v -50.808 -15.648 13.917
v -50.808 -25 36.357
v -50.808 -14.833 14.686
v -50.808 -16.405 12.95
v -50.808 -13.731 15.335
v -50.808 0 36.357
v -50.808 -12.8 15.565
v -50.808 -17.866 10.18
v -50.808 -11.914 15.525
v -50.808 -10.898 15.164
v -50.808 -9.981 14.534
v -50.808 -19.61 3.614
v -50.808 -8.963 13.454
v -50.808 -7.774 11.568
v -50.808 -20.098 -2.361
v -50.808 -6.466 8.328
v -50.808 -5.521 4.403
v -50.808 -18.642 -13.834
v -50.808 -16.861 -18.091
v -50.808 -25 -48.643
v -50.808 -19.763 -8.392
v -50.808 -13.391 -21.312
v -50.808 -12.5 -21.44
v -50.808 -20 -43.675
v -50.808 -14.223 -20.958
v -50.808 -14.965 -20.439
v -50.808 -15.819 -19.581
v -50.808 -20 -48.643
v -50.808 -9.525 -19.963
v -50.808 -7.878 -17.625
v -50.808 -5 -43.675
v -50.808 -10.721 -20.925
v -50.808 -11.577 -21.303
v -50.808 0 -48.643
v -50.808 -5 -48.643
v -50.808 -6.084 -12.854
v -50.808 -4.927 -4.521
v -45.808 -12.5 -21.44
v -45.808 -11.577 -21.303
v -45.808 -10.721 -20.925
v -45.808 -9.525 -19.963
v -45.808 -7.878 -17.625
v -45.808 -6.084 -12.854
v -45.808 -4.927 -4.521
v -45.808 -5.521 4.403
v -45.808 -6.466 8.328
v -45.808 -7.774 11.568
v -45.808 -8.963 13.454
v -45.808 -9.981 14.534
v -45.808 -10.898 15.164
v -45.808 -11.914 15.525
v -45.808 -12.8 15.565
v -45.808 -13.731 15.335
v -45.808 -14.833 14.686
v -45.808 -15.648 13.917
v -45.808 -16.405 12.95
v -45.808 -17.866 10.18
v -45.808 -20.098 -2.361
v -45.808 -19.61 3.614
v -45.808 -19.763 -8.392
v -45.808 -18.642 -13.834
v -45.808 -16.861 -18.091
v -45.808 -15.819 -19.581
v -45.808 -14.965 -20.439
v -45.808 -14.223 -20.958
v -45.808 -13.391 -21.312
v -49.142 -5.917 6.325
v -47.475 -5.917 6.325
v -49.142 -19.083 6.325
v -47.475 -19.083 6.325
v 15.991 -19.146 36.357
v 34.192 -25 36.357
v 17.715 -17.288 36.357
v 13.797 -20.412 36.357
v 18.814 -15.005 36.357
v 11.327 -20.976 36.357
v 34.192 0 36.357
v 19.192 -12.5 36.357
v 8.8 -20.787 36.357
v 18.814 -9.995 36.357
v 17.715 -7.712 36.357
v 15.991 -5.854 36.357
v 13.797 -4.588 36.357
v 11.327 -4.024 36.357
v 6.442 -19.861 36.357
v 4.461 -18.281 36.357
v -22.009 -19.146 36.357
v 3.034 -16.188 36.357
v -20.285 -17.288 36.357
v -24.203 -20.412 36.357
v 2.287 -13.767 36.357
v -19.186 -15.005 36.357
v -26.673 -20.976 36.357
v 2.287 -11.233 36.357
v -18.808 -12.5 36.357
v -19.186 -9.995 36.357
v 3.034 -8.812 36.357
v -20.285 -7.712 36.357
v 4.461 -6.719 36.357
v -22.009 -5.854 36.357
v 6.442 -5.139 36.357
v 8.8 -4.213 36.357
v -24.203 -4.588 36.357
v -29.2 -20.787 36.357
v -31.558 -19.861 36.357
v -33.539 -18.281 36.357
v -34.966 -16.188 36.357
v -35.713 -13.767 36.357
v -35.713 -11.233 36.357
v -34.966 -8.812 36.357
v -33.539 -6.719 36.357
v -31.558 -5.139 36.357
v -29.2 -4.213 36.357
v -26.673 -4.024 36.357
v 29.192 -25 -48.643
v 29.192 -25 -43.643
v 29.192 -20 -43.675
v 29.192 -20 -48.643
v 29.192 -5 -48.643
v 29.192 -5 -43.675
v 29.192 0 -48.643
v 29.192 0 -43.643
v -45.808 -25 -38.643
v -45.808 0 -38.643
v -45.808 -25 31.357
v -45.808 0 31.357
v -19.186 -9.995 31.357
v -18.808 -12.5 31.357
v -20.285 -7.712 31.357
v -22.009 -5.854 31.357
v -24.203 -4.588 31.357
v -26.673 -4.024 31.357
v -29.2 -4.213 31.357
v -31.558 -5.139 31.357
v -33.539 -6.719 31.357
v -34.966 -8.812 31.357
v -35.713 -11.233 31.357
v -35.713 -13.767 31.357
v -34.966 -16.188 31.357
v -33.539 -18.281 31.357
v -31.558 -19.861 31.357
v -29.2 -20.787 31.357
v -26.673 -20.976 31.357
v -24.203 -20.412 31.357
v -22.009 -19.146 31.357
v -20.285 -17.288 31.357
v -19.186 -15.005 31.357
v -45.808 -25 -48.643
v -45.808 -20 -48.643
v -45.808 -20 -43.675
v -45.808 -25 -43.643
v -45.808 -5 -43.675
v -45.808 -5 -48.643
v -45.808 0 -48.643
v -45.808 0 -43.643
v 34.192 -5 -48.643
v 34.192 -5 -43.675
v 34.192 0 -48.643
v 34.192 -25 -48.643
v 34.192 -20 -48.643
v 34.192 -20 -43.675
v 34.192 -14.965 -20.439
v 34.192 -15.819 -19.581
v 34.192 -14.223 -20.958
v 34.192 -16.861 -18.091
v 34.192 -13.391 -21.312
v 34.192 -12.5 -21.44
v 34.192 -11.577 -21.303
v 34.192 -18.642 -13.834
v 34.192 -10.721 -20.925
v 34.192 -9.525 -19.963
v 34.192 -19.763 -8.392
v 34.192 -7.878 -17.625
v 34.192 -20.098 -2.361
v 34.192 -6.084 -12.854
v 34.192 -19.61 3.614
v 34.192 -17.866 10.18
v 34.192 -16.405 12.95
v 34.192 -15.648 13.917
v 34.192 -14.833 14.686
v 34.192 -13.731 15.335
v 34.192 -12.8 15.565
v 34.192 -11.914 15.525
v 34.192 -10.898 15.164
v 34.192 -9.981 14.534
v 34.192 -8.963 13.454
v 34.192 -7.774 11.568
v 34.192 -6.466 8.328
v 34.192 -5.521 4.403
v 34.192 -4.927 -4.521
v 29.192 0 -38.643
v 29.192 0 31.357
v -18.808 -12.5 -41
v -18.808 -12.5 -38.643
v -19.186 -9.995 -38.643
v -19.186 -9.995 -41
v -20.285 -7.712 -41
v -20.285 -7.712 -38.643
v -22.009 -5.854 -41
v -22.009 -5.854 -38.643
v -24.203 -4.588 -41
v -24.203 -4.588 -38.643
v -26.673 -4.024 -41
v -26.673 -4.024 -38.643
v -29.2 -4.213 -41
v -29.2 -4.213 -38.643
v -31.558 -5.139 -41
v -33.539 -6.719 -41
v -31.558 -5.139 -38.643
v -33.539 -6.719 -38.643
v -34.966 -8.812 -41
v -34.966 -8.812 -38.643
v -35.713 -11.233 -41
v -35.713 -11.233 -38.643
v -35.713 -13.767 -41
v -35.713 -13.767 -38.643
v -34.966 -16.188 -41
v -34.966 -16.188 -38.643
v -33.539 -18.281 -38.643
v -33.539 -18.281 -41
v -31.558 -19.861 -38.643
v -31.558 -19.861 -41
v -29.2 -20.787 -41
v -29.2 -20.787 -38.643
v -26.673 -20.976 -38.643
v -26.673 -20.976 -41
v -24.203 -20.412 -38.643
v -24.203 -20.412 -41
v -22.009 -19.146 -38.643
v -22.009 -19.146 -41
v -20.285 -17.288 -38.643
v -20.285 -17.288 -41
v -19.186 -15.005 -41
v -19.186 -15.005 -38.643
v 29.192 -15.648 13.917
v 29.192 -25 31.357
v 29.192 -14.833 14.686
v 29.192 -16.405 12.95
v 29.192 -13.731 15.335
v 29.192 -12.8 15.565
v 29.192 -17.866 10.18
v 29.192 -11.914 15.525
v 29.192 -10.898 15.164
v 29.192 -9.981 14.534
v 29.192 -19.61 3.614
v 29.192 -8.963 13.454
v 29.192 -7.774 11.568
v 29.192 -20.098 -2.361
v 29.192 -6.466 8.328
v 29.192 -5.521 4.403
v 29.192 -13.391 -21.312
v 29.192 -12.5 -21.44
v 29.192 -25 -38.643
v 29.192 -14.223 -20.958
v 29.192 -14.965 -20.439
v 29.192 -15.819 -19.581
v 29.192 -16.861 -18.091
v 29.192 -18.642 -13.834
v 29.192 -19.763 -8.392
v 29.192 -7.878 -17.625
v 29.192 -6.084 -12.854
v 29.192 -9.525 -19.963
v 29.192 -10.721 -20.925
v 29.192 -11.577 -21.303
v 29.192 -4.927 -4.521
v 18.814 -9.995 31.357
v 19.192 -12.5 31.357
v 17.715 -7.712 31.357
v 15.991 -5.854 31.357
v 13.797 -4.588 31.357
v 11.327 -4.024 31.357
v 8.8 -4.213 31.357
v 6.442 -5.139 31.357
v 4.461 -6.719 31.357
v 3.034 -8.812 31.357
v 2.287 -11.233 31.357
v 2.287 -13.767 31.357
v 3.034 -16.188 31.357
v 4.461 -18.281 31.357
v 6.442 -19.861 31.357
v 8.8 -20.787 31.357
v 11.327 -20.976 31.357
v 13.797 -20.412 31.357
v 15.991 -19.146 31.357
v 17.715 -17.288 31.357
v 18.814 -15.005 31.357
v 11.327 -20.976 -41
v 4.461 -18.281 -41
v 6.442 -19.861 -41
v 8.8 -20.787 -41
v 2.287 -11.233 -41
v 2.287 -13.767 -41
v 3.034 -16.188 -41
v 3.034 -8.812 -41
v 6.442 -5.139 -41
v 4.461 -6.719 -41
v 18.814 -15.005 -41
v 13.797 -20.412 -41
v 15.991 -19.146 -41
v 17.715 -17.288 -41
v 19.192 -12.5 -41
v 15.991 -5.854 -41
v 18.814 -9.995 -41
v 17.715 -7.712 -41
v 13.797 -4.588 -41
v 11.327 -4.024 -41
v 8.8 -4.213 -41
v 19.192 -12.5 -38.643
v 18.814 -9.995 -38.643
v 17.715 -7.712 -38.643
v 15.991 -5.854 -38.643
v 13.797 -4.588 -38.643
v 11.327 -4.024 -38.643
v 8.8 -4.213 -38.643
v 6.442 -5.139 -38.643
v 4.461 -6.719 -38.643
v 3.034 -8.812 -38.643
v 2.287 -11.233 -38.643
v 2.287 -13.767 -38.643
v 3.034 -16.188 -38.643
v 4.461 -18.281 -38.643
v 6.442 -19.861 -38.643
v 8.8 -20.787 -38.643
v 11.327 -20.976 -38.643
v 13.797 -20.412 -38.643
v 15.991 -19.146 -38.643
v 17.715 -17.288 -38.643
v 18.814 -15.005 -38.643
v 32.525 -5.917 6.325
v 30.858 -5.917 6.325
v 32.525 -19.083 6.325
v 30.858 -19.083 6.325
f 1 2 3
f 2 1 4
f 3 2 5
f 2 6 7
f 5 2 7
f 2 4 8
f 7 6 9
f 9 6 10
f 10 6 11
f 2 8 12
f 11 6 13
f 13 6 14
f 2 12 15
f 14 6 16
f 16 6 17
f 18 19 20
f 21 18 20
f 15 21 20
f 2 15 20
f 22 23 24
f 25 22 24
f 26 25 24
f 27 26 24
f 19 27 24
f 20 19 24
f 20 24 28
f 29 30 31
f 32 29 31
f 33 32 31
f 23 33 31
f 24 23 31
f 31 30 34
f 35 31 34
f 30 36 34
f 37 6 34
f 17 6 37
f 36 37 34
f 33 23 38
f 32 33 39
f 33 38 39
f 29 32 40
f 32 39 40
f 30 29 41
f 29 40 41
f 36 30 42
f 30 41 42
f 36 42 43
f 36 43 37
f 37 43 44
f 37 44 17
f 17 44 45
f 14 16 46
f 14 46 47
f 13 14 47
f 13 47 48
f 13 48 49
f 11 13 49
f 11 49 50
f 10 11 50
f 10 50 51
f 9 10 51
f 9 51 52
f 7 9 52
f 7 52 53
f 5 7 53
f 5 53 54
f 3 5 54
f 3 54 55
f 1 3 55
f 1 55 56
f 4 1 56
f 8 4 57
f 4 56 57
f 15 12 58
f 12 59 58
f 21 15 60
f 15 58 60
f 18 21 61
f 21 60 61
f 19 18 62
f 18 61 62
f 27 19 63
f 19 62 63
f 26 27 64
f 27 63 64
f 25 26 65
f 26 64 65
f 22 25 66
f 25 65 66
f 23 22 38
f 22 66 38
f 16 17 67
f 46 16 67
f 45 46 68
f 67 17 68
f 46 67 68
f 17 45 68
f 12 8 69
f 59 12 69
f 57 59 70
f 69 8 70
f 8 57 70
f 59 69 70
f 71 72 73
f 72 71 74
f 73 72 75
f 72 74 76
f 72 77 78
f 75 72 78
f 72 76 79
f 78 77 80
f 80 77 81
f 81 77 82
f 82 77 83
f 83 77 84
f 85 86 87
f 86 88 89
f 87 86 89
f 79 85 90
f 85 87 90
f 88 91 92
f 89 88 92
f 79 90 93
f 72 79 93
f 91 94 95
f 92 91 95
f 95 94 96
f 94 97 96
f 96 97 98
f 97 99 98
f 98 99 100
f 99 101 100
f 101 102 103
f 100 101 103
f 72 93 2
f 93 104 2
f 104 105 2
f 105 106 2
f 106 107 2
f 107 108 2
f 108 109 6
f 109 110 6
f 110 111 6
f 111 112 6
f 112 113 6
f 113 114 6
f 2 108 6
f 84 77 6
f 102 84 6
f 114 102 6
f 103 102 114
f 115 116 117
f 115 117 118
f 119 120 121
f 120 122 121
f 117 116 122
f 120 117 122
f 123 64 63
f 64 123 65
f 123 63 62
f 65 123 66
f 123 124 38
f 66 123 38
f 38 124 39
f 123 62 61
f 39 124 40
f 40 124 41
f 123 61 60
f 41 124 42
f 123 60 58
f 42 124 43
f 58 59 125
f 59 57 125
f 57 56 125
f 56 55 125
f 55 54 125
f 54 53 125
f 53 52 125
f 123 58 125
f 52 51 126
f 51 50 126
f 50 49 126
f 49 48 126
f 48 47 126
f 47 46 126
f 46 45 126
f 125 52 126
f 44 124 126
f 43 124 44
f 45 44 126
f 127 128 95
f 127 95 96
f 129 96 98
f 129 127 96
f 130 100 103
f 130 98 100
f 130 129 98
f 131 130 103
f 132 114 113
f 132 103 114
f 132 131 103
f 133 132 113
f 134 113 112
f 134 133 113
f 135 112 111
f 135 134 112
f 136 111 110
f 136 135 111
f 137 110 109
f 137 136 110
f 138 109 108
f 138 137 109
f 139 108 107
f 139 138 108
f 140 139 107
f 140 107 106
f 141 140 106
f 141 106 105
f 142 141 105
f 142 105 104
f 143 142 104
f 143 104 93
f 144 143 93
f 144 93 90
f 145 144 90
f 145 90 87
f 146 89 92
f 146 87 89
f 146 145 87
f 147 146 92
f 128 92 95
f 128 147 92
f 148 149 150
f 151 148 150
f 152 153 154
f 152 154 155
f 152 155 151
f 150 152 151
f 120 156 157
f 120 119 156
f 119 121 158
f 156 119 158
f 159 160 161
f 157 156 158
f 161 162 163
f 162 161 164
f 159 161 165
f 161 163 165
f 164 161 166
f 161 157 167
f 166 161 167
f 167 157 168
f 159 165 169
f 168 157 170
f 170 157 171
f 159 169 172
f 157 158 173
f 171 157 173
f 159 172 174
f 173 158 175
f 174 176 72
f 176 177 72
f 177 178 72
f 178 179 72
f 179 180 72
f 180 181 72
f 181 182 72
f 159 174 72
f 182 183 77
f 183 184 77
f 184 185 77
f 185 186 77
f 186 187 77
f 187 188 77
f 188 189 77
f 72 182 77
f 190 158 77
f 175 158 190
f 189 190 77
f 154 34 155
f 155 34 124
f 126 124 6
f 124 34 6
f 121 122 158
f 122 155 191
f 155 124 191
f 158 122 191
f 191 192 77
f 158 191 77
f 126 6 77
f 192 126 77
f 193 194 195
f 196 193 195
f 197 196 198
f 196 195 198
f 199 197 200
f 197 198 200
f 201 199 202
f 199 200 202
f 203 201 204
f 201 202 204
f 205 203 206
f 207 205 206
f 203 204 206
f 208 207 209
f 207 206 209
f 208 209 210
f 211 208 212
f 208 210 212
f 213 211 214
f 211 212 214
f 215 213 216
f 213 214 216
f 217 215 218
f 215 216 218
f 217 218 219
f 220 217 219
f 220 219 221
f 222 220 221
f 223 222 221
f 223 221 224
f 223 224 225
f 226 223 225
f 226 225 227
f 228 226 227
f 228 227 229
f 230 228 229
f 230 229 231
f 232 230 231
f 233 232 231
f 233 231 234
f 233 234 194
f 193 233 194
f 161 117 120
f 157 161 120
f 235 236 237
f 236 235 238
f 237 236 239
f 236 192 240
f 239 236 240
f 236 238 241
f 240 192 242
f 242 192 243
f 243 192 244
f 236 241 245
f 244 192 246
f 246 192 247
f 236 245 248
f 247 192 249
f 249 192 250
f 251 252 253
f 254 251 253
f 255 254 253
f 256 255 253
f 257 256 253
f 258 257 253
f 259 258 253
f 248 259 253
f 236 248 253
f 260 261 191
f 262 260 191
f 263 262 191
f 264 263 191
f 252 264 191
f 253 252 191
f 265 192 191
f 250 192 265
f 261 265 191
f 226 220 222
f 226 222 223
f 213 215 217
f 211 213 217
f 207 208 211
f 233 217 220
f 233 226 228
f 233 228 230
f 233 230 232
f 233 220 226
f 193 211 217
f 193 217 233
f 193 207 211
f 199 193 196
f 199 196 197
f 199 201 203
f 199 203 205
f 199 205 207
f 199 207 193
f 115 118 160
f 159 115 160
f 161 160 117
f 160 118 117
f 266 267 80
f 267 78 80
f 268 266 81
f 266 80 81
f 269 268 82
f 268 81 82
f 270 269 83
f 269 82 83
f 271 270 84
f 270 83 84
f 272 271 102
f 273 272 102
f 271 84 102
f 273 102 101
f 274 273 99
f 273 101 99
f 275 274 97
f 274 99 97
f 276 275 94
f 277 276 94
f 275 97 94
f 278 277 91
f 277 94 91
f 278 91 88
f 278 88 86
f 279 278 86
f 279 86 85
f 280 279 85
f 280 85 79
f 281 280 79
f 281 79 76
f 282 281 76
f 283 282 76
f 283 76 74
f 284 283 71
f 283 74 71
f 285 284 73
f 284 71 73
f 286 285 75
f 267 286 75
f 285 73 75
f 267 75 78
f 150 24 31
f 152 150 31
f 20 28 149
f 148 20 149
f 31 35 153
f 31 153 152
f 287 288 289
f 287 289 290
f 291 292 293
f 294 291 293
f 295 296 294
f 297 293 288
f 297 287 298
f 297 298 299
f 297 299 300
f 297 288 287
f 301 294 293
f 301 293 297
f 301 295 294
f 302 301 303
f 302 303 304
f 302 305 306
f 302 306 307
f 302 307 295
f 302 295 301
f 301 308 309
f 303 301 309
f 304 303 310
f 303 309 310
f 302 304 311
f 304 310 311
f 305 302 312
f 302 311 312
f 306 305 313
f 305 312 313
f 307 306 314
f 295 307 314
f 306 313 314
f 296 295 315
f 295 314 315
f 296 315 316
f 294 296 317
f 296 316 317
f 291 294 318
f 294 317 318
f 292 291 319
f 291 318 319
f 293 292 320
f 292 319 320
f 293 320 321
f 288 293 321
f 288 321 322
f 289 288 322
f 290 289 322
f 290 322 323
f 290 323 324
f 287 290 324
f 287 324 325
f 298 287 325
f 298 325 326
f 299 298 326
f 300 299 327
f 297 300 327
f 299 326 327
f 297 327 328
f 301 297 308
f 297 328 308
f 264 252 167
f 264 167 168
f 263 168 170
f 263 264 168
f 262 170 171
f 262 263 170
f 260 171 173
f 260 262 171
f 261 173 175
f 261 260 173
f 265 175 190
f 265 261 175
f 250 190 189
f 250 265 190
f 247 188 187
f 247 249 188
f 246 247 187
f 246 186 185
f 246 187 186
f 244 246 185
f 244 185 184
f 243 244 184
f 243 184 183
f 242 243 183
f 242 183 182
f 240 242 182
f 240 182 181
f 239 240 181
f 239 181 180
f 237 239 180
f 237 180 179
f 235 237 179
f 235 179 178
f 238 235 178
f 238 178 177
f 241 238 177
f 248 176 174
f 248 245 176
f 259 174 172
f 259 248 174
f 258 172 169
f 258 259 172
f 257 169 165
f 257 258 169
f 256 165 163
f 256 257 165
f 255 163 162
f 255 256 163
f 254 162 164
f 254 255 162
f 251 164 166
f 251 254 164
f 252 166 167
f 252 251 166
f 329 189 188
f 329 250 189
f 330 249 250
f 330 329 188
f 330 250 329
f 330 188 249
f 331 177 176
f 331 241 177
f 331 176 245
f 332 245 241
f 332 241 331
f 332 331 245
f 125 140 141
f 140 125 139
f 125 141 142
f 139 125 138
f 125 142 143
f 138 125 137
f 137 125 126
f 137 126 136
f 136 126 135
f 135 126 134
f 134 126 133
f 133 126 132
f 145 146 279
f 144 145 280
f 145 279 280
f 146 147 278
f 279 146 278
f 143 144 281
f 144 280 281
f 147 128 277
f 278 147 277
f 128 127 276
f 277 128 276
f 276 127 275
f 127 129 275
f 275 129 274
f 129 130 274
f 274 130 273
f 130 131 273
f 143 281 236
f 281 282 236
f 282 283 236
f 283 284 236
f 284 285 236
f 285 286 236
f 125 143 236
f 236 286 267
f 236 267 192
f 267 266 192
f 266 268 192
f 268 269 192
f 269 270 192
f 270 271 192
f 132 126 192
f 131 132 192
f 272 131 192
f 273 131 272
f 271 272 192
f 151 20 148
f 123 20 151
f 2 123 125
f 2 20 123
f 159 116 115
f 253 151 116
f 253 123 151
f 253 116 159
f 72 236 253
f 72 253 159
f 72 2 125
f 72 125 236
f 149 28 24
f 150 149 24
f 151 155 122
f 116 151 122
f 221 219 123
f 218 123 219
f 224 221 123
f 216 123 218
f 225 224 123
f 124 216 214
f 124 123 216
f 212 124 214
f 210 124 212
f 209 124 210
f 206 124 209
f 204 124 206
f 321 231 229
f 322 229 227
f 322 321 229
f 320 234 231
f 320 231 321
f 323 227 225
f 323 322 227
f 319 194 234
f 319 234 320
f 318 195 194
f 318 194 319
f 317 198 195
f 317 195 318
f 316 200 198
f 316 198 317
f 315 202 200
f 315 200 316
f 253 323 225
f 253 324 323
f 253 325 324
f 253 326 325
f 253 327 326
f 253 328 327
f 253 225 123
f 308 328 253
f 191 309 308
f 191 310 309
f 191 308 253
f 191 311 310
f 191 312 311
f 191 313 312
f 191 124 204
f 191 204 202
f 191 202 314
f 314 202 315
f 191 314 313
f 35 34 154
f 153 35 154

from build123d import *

# Parameters (mm, degrees)
F0_W     = 75
F0_H     = 5
F1_DEPTH = 25
F2_W     = 15
F2_H     = 5
F3_DEPTH = 100
F4_R     = 8.5
F5_DEPTH = 41


with BuildPart() as f1:
    # F0 (on Front) → F1 (new body)
    with BuildSketch(Plane.XZ):
        Polygon((-45.808392, 36.356615), (-50.808392, 36.356615), (-50.808392, -48.643385), (-45.808392, -48.643385), (-45.808392, -43.643385), (-45.808392, -38.643385), (-45.808392, 31.356615), align=None)
        with Locations((-8.308392, 33.856615)):
            Rectangle(F0_W, F0_H)
        Polygon((34.191608, 36.356615), (29.191608, 36.356615), (29.191608, 31.356615), (29.191608, -38.643385), (29.191608, -43.643385), (29.191608, -48.643385), (34.191608, -48.643385), align=None)
        with Locations((-8.308392, -41.143385)):
            Rectangle(F0_W, F0_H)
    extrude(amount=F1_DEPTH)

    # F2 (on Right) → F3 (cut, symmetric)
    with BuildSketch(Plane.YZ):
        with Locations((-12.5, -46.175022)):
            Rectangle(F2_W, F2_H)
        with BuildLine():
            add(Edge.make_bspline(
                [(-12.5, -21.439629), (0.665701, -21.439629), (-5.91715, 6.324914), (-12.5, 34.089457), (-19.08285, 6.324914), (-25.665701, -21.439629), (-12.5, -21.439629)],
                knots=[0, 0, 0, 2.094395, 2.094395, 4.18879, 4.18879, 6.283185, 6.283185, 6.283185], degree=2, weights=[1, 0.5, 1, 0.5, 1, 0.5, 1]))
        make_face()
    extrude(amount=F3_DEPTH, both=True, mode=Mode.SUBTRACT)

    # F4 (on Top) → F5 (cut, symmetric)
    with BuildSketch(Plane.XY):
        with Locations((-27.308246, -12.5)):
            Circle(F4_R)
        with Locations((10.691754, -12.5)):
            Circle(F4_R)
    extrude(amount=F5_DEPTH, both=True, mode=Mode.SUBTRACT)


solid = f1.part
